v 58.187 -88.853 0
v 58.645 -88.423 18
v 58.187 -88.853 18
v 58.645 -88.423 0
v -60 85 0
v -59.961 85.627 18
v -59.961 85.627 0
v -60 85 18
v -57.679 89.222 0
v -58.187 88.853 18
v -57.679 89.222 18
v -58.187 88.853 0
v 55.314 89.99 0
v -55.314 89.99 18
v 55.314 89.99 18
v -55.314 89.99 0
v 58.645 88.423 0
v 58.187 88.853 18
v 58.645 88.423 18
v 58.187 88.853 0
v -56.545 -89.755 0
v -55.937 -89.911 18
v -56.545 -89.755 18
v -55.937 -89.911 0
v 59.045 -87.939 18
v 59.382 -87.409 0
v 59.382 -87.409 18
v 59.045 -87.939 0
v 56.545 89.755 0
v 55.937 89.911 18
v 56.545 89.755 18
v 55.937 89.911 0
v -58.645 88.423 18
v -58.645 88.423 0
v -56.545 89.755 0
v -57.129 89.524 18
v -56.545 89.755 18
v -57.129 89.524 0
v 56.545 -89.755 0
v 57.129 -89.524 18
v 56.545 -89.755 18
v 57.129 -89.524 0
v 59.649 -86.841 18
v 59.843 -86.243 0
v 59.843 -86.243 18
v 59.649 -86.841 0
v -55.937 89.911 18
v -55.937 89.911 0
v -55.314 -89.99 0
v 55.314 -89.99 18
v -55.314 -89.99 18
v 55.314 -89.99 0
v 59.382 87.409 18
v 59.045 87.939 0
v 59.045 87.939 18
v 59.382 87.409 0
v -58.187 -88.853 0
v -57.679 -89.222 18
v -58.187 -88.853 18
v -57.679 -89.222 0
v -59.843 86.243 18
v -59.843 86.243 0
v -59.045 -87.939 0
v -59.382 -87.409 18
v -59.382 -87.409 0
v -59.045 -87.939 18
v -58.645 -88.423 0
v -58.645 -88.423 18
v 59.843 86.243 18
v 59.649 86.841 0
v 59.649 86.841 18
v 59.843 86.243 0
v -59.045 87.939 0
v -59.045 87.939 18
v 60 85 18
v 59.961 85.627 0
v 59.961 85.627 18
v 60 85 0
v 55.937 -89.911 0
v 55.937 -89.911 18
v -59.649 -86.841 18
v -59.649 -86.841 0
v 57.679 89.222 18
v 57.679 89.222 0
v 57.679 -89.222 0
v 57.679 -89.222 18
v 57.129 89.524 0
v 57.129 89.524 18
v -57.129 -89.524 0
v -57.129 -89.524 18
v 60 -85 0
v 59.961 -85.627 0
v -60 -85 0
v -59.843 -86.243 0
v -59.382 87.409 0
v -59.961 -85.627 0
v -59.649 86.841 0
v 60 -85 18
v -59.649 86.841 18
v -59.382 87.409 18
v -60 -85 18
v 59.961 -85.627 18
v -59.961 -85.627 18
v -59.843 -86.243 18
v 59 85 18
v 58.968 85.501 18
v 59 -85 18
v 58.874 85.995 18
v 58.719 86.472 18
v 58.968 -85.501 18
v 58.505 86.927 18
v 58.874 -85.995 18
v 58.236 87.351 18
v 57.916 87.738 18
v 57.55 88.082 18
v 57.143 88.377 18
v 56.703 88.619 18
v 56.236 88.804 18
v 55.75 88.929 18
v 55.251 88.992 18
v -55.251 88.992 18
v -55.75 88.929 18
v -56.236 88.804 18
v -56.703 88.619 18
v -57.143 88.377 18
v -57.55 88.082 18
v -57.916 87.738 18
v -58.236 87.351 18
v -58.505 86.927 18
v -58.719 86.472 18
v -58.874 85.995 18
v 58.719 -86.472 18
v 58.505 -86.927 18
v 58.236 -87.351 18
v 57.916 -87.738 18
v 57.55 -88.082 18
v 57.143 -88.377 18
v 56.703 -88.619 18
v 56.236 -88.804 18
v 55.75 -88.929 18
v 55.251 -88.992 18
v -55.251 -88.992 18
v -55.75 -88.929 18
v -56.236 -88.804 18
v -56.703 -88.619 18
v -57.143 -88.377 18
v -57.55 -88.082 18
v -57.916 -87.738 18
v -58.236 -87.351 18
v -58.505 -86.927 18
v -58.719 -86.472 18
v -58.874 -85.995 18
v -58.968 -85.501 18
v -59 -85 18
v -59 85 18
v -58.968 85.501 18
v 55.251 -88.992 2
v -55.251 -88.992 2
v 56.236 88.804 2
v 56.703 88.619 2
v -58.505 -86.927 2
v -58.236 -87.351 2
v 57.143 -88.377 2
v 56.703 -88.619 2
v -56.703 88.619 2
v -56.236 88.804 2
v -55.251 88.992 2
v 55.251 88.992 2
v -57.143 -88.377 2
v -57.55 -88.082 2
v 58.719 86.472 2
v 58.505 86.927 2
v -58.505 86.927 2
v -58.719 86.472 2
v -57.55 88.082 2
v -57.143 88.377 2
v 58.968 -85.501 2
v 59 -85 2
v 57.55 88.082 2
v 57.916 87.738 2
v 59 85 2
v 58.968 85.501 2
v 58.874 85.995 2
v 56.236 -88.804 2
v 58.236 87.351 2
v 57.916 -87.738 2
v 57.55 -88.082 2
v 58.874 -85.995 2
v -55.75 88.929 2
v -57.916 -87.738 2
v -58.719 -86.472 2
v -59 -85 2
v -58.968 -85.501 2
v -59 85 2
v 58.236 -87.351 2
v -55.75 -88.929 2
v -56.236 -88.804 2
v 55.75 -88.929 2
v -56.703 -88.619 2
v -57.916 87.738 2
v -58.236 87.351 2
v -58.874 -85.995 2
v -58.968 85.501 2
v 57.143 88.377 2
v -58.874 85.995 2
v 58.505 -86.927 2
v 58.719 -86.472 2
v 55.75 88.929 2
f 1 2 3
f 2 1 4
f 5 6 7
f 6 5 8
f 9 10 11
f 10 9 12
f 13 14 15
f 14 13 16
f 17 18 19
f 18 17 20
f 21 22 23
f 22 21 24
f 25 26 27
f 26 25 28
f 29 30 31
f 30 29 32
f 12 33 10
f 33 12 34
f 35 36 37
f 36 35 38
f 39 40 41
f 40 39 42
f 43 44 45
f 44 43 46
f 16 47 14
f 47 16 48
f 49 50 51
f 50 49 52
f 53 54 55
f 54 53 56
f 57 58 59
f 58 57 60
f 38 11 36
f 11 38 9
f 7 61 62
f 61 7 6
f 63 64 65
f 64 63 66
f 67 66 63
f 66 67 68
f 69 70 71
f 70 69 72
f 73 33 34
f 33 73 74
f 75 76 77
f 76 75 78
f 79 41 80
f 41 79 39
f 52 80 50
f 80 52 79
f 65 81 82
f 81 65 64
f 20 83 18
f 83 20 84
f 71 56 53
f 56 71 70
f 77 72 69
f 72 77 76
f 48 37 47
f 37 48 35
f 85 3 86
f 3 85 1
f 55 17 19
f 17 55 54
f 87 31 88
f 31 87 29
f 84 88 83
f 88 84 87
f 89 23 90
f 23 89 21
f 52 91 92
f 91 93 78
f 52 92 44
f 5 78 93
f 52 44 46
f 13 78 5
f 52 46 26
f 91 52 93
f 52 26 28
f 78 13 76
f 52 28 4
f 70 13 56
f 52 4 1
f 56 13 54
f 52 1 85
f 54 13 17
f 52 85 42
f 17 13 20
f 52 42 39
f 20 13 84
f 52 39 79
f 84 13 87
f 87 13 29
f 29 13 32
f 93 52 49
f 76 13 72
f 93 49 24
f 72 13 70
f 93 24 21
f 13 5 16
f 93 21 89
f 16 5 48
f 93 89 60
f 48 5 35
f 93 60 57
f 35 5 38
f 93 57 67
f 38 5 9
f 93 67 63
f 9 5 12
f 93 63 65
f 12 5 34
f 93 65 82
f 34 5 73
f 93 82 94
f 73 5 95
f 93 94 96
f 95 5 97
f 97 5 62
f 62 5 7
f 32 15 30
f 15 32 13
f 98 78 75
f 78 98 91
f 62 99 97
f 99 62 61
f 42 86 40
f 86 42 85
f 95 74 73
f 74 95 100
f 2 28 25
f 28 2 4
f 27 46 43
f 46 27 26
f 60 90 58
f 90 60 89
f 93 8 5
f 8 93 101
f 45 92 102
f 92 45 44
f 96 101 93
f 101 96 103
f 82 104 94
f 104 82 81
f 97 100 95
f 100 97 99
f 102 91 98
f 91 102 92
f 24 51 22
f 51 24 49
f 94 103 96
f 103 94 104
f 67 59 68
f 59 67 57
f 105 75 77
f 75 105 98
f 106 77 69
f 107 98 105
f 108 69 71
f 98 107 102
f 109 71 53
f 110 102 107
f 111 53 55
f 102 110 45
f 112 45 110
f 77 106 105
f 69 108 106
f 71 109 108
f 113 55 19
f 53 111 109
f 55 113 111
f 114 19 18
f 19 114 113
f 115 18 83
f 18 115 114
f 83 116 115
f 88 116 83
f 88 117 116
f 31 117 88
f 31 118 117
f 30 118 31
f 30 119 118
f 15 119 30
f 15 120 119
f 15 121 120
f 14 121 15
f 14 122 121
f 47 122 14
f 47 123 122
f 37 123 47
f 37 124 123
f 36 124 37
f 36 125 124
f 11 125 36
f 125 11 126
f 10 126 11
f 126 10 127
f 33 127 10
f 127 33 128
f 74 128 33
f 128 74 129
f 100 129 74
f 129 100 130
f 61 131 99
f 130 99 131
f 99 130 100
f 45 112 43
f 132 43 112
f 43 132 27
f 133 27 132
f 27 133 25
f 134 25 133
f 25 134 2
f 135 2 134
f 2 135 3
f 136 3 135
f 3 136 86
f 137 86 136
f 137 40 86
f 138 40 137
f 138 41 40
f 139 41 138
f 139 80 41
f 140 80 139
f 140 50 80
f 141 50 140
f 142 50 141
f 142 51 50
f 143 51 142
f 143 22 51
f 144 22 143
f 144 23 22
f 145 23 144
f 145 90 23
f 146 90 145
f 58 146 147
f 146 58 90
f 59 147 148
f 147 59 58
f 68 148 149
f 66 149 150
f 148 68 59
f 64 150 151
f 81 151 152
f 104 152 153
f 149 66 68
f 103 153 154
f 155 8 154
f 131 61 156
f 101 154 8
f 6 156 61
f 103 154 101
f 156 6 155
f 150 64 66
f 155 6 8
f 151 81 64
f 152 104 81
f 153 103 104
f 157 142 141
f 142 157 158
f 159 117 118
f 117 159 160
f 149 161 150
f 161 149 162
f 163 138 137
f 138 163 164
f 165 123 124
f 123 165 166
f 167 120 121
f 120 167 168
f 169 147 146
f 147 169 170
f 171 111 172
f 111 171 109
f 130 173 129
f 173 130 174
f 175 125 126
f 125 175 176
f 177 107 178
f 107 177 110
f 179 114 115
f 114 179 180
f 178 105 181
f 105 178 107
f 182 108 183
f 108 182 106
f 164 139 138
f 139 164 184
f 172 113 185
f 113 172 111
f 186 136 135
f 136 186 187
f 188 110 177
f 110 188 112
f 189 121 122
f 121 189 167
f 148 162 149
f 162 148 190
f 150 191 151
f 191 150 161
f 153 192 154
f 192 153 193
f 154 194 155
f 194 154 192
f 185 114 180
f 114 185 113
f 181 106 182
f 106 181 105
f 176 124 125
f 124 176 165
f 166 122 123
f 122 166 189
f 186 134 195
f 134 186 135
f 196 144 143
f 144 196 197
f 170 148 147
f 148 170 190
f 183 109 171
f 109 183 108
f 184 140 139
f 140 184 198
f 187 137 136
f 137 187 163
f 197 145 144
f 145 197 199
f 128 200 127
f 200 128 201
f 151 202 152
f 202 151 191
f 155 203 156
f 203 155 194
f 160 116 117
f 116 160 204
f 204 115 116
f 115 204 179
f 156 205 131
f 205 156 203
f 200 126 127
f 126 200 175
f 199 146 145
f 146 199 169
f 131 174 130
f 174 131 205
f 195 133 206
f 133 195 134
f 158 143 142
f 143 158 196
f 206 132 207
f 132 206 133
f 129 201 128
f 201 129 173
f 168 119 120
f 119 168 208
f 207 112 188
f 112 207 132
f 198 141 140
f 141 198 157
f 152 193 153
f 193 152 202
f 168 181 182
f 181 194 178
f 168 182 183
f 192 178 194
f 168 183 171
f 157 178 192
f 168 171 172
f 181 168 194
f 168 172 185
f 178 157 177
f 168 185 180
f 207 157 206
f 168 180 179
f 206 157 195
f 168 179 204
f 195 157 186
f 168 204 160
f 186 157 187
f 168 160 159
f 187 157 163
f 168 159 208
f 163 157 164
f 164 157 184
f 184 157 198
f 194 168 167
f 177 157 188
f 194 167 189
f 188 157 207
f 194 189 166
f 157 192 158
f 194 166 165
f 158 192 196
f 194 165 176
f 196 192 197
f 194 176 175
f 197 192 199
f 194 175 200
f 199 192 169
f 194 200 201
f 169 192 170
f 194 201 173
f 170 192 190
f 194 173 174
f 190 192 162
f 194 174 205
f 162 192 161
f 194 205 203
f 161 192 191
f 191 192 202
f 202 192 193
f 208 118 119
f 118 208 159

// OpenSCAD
$fn = 50;


difference() {
	union() {
		hull() {
			translate(v = [-55.0000000000, 85.0000000000, 0]) {
				cylinder(h = 18, r = 5);
			}
			translate(v = [55.0000000000, 85.0000000000, 0]) {
				cylinder(h = 18, r = 5);
			}
			translate(v = [-55.0000000000, -85.0000000000, 0]) {
				cylinder(h = 18, r = 5);
			}
			translate(v = [55.0000000000, -85.0000000000, 0]) {
				cylinder(h = 18, r = 5);
			}
		}
	}
	union() {
		translate(v = [0, 0, 2]) {
			hull() {
				translate(v = [-55.0000000000, 85.0000000000, 0]) {
					cylinder(h = 16, r = 4);
				}
				translate(v = [55.0000000000, 85.0000000000, 0]) {
					cylinder(h = 16, r = 4);
				}
				translate(v = [-55.0000000000, -85.0000000000, 0]) {
					cylinder(h = 16, r = 4);
				}
				translate(v = [55.0000000000, -85.0000000000, 0]) {
					cylinder(h = 16, r = 4);
				}
			}
		}
	}
}
